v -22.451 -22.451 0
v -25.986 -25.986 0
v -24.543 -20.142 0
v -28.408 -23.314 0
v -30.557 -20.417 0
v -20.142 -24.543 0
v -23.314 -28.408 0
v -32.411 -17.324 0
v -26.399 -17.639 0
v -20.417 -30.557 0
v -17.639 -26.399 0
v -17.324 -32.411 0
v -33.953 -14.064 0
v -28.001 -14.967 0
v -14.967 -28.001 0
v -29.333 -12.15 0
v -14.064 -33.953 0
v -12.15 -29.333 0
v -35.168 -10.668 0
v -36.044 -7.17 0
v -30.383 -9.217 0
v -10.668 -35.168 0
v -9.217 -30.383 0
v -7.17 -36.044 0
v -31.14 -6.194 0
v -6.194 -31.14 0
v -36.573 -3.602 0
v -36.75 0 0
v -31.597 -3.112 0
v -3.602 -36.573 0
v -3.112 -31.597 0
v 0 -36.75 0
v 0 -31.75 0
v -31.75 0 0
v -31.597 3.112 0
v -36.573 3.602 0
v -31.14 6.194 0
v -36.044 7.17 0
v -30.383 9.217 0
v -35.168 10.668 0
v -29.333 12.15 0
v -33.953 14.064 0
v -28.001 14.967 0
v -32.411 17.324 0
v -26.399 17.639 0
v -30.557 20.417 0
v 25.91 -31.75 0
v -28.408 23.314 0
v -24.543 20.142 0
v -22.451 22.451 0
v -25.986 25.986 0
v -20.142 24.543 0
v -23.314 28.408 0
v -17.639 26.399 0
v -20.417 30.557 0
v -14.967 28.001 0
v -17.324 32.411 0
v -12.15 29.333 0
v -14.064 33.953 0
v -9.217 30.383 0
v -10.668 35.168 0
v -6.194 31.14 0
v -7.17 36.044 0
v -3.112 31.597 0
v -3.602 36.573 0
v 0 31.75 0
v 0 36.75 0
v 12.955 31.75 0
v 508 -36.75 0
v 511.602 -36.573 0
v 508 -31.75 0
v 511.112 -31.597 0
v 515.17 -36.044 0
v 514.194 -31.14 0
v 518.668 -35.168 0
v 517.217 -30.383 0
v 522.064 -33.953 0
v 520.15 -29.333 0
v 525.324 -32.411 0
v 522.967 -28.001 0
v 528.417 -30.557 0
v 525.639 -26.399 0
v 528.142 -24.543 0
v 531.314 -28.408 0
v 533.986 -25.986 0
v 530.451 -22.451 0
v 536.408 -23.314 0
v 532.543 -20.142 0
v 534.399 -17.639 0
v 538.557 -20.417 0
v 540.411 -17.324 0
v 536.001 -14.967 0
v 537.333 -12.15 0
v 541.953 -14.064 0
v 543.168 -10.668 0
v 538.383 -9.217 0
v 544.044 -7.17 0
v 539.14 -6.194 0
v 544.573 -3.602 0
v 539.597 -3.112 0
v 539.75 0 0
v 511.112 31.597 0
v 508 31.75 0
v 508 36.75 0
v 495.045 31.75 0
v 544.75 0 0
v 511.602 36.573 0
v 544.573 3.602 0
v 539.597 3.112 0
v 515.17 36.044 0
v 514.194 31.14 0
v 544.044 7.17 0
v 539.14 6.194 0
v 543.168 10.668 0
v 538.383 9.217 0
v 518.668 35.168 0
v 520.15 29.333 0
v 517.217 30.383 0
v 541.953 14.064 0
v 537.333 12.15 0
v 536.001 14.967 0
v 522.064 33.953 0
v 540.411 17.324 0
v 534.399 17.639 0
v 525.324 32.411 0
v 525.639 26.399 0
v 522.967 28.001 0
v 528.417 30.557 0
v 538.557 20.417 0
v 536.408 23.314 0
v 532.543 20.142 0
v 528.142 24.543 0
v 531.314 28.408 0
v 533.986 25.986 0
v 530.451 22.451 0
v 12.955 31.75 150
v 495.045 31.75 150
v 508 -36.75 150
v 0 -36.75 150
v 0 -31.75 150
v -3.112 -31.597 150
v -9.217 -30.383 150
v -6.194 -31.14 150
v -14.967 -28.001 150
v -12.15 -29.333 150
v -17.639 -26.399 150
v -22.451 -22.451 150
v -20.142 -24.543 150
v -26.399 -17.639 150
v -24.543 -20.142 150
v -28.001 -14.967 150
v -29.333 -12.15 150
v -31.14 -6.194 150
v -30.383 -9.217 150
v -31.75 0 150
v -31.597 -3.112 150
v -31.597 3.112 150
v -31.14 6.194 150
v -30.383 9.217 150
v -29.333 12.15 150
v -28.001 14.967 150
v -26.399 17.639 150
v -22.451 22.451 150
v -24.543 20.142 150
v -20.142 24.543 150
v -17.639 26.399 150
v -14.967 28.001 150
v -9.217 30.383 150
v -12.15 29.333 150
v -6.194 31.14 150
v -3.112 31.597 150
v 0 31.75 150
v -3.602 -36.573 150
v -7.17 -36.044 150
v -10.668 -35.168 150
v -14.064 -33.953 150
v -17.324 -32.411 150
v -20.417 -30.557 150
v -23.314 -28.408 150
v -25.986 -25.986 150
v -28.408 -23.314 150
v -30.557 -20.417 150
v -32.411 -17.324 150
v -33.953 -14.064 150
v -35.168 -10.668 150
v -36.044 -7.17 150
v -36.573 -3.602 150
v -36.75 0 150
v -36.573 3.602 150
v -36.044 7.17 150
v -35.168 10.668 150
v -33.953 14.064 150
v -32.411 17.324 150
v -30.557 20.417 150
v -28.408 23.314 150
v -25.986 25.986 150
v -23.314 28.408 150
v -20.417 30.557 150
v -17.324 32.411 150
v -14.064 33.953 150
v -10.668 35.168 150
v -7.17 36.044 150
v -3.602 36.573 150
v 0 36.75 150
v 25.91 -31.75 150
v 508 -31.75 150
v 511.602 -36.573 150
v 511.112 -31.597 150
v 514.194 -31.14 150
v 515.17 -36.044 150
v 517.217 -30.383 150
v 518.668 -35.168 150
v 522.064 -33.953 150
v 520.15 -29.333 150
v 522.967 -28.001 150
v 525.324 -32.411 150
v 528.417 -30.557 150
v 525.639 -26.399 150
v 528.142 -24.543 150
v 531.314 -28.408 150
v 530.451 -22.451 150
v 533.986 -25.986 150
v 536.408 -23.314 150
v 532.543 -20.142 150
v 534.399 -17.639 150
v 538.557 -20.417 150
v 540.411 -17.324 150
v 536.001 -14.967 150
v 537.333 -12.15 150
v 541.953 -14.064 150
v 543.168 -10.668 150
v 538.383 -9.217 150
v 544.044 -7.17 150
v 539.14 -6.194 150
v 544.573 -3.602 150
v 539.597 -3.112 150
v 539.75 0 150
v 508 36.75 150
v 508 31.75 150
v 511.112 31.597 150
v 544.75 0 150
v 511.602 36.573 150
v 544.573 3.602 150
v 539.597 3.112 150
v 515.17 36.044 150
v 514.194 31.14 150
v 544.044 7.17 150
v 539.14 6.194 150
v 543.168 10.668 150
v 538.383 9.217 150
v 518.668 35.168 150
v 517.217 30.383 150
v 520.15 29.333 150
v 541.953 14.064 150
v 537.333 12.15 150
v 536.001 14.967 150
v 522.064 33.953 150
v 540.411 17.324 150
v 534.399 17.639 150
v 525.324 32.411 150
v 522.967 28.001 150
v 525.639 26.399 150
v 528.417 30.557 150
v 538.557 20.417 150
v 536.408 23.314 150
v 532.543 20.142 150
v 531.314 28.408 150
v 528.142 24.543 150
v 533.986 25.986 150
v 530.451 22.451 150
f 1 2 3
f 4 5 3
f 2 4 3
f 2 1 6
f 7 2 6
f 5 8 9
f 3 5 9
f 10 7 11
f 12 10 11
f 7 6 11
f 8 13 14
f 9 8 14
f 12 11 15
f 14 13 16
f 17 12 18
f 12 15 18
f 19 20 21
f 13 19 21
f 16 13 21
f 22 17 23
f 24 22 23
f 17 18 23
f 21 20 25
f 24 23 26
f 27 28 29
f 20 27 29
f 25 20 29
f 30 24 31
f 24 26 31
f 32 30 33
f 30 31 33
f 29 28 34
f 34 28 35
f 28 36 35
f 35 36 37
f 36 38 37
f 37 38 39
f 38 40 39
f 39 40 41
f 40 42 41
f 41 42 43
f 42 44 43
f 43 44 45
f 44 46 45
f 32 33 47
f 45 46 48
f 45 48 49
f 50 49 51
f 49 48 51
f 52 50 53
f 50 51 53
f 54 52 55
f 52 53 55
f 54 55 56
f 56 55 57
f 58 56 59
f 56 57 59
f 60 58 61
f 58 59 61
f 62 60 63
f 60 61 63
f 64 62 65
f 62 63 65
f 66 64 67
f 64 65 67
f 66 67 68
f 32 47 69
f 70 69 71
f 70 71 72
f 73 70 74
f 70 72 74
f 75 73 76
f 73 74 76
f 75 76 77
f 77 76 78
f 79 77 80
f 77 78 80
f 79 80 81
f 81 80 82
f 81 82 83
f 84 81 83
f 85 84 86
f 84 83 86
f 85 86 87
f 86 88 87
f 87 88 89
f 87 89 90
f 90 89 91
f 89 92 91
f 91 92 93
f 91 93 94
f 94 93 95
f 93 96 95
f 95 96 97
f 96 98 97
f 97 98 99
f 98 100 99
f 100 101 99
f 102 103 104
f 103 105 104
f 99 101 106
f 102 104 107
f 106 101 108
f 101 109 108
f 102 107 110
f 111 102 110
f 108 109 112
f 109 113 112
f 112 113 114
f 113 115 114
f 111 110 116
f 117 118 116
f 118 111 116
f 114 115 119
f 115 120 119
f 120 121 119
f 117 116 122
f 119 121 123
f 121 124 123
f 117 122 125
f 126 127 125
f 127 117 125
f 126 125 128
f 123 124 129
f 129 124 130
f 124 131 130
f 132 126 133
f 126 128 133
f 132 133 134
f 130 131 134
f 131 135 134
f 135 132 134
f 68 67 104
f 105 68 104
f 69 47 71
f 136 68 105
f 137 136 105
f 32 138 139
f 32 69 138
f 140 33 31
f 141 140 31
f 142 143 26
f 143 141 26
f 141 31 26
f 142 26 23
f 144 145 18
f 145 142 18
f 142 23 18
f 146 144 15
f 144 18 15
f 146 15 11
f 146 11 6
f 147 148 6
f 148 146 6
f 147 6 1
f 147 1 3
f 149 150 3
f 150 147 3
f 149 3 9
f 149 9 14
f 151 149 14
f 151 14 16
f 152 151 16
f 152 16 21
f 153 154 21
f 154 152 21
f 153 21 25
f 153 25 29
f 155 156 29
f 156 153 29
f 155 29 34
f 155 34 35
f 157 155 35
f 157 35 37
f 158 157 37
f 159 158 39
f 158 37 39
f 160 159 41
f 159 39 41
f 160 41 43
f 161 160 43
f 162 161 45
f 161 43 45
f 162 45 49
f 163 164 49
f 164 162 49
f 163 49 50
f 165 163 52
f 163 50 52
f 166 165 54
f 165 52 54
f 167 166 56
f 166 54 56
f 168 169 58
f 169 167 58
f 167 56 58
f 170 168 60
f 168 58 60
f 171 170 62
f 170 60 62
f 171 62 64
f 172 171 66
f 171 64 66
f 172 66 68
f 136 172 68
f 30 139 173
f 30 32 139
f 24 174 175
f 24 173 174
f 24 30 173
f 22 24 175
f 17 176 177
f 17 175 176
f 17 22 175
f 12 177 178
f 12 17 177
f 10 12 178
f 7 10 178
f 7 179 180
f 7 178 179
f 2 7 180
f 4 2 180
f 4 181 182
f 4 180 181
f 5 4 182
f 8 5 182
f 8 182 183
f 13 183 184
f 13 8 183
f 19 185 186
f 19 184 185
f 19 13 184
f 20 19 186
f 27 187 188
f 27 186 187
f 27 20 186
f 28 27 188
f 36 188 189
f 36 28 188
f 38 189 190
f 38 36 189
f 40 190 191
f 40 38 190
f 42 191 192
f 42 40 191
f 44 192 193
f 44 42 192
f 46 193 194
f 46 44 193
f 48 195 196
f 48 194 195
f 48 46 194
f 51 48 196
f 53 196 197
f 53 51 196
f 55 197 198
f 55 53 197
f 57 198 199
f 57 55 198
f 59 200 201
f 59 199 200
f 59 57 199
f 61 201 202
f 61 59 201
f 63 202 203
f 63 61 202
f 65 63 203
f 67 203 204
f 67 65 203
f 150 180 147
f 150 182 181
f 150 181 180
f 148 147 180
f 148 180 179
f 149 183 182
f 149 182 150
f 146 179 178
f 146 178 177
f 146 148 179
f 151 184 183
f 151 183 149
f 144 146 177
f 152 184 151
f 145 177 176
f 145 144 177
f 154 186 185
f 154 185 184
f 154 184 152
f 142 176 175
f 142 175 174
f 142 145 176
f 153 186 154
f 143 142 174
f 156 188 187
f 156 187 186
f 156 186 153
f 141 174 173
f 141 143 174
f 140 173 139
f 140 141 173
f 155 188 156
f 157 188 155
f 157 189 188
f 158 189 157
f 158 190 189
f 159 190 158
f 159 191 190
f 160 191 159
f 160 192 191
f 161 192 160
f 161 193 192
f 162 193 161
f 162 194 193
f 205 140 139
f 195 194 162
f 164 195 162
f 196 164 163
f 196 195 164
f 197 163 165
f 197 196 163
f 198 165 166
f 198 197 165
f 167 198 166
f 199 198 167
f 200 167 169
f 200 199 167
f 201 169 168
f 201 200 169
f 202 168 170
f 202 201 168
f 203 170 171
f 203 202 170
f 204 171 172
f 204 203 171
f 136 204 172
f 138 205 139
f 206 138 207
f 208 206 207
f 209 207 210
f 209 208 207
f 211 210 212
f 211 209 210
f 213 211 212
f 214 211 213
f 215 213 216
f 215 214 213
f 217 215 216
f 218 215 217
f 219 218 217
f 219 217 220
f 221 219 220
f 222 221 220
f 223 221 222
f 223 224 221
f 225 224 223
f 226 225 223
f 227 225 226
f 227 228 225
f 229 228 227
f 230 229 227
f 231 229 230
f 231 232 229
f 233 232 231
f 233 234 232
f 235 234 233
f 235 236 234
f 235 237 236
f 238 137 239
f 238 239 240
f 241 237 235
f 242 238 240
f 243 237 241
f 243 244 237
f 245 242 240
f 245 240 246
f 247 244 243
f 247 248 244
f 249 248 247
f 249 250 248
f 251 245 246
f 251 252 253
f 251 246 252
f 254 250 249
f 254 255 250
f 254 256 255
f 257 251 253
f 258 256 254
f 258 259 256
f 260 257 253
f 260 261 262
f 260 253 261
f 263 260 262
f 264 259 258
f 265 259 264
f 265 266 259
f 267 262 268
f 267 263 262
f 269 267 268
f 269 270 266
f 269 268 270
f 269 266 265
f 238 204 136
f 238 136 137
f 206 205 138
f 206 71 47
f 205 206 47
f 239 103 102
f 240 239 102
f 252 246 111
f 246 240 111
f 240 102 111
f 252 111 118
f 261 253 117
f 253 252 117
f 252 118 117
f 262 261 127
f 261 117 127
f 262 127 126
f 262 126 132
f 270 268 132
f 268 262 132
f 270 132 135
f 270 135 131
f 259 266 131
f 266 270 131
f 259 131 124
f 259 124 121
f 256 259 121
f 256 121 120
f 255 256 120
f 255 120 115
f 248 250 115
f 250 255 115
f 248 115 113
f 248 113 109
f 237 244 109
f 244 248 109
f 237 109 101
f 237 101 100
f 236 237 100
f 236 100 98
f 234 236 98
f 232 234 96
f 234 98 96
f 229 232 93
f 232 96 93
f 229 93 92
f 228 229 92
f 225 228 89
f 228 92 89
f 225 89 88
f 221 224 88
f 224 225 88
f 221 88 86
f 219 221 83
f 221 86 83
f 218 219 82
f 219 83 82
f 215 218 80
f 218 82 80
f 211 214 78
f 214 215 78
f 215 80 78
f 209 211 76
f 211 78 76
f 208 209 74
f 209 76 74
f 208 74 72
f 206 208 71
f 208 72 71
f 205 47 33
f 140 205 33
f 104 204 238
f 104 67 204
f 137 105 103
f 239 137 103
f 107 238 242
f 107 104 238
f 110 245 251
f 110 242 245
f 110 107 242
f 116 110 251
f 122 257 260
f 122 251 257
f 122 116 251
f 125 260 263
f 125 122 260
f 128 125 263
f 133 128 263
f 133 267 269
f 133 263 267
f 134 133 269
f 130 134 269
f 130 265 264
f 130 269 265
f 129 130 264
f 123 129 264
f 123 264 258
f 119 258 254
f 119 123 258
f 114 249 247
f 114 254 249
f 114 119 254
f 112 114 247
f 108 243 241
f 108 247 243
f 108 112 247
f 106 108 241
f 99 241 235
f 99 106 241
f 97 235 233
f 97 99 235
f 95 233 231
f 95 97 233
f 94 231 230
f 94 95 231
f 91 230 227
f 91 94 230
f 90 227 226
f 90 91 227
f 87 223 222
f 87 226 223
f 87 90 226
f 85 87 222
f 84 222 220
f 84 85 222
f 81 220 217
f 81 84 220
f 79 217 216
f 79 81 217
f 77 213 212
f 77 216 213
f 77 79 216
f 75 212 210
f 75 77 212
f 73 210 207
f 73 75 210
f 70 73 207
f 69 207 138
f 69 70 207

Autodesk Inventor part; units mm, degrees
ref_plane "YZ Plane" through (0, 0, 0) normal (1, 0, 0) x (0, 1, 0)
ref_plane "XZ Plane" through (0, 0, 0) normal (0, 1, 0) x (-1, 0, 0)
ref_plane "XY Plane" through (0, 0, 0) normal (0, 0, 1) x (1, 0, 0)
sketch "Sketch1" plane through (0, 0, 0) normal (0, 0, 1) x (1, 0, 0)
  arc A0 (0, 31.75) -> (0, -31.75) centre (0, 0) ccw
  arc A1 (508, -31.75) -> (508, 31.75) centre (508, 0) ccw
  line L0 (508, -31.75) -> (25.9095, -31.75)
  line L1 (0, 31.75) -> (12.9547, 31.75)
  arc A2 (0, 36.75) -> (0, -36.75) centre (0, 0) ccw
  line L2 (0, 36.75) -> (508, 36.75)
  line L3 (508, -36.75) -> (0, -36.75)
  arc A3 (508, -36.75) -> (508, 36.75) centre (508, 0) ccw
  line L4 (495.0453, 31.75) -> (508, 31.75)
  line L5 (12.9547, 31.75) -> (495.0453, 31.75)
  line L6 (25.9095, -31.75) -> (0, -31.75)
  dimension "d0" = 63.5
  dimension "d1" = 508
  dimension "d2" = 73.5
extrude "Extrusion1" add sketch "Sketch1" along normal blind 150
properties part number "banda1"
